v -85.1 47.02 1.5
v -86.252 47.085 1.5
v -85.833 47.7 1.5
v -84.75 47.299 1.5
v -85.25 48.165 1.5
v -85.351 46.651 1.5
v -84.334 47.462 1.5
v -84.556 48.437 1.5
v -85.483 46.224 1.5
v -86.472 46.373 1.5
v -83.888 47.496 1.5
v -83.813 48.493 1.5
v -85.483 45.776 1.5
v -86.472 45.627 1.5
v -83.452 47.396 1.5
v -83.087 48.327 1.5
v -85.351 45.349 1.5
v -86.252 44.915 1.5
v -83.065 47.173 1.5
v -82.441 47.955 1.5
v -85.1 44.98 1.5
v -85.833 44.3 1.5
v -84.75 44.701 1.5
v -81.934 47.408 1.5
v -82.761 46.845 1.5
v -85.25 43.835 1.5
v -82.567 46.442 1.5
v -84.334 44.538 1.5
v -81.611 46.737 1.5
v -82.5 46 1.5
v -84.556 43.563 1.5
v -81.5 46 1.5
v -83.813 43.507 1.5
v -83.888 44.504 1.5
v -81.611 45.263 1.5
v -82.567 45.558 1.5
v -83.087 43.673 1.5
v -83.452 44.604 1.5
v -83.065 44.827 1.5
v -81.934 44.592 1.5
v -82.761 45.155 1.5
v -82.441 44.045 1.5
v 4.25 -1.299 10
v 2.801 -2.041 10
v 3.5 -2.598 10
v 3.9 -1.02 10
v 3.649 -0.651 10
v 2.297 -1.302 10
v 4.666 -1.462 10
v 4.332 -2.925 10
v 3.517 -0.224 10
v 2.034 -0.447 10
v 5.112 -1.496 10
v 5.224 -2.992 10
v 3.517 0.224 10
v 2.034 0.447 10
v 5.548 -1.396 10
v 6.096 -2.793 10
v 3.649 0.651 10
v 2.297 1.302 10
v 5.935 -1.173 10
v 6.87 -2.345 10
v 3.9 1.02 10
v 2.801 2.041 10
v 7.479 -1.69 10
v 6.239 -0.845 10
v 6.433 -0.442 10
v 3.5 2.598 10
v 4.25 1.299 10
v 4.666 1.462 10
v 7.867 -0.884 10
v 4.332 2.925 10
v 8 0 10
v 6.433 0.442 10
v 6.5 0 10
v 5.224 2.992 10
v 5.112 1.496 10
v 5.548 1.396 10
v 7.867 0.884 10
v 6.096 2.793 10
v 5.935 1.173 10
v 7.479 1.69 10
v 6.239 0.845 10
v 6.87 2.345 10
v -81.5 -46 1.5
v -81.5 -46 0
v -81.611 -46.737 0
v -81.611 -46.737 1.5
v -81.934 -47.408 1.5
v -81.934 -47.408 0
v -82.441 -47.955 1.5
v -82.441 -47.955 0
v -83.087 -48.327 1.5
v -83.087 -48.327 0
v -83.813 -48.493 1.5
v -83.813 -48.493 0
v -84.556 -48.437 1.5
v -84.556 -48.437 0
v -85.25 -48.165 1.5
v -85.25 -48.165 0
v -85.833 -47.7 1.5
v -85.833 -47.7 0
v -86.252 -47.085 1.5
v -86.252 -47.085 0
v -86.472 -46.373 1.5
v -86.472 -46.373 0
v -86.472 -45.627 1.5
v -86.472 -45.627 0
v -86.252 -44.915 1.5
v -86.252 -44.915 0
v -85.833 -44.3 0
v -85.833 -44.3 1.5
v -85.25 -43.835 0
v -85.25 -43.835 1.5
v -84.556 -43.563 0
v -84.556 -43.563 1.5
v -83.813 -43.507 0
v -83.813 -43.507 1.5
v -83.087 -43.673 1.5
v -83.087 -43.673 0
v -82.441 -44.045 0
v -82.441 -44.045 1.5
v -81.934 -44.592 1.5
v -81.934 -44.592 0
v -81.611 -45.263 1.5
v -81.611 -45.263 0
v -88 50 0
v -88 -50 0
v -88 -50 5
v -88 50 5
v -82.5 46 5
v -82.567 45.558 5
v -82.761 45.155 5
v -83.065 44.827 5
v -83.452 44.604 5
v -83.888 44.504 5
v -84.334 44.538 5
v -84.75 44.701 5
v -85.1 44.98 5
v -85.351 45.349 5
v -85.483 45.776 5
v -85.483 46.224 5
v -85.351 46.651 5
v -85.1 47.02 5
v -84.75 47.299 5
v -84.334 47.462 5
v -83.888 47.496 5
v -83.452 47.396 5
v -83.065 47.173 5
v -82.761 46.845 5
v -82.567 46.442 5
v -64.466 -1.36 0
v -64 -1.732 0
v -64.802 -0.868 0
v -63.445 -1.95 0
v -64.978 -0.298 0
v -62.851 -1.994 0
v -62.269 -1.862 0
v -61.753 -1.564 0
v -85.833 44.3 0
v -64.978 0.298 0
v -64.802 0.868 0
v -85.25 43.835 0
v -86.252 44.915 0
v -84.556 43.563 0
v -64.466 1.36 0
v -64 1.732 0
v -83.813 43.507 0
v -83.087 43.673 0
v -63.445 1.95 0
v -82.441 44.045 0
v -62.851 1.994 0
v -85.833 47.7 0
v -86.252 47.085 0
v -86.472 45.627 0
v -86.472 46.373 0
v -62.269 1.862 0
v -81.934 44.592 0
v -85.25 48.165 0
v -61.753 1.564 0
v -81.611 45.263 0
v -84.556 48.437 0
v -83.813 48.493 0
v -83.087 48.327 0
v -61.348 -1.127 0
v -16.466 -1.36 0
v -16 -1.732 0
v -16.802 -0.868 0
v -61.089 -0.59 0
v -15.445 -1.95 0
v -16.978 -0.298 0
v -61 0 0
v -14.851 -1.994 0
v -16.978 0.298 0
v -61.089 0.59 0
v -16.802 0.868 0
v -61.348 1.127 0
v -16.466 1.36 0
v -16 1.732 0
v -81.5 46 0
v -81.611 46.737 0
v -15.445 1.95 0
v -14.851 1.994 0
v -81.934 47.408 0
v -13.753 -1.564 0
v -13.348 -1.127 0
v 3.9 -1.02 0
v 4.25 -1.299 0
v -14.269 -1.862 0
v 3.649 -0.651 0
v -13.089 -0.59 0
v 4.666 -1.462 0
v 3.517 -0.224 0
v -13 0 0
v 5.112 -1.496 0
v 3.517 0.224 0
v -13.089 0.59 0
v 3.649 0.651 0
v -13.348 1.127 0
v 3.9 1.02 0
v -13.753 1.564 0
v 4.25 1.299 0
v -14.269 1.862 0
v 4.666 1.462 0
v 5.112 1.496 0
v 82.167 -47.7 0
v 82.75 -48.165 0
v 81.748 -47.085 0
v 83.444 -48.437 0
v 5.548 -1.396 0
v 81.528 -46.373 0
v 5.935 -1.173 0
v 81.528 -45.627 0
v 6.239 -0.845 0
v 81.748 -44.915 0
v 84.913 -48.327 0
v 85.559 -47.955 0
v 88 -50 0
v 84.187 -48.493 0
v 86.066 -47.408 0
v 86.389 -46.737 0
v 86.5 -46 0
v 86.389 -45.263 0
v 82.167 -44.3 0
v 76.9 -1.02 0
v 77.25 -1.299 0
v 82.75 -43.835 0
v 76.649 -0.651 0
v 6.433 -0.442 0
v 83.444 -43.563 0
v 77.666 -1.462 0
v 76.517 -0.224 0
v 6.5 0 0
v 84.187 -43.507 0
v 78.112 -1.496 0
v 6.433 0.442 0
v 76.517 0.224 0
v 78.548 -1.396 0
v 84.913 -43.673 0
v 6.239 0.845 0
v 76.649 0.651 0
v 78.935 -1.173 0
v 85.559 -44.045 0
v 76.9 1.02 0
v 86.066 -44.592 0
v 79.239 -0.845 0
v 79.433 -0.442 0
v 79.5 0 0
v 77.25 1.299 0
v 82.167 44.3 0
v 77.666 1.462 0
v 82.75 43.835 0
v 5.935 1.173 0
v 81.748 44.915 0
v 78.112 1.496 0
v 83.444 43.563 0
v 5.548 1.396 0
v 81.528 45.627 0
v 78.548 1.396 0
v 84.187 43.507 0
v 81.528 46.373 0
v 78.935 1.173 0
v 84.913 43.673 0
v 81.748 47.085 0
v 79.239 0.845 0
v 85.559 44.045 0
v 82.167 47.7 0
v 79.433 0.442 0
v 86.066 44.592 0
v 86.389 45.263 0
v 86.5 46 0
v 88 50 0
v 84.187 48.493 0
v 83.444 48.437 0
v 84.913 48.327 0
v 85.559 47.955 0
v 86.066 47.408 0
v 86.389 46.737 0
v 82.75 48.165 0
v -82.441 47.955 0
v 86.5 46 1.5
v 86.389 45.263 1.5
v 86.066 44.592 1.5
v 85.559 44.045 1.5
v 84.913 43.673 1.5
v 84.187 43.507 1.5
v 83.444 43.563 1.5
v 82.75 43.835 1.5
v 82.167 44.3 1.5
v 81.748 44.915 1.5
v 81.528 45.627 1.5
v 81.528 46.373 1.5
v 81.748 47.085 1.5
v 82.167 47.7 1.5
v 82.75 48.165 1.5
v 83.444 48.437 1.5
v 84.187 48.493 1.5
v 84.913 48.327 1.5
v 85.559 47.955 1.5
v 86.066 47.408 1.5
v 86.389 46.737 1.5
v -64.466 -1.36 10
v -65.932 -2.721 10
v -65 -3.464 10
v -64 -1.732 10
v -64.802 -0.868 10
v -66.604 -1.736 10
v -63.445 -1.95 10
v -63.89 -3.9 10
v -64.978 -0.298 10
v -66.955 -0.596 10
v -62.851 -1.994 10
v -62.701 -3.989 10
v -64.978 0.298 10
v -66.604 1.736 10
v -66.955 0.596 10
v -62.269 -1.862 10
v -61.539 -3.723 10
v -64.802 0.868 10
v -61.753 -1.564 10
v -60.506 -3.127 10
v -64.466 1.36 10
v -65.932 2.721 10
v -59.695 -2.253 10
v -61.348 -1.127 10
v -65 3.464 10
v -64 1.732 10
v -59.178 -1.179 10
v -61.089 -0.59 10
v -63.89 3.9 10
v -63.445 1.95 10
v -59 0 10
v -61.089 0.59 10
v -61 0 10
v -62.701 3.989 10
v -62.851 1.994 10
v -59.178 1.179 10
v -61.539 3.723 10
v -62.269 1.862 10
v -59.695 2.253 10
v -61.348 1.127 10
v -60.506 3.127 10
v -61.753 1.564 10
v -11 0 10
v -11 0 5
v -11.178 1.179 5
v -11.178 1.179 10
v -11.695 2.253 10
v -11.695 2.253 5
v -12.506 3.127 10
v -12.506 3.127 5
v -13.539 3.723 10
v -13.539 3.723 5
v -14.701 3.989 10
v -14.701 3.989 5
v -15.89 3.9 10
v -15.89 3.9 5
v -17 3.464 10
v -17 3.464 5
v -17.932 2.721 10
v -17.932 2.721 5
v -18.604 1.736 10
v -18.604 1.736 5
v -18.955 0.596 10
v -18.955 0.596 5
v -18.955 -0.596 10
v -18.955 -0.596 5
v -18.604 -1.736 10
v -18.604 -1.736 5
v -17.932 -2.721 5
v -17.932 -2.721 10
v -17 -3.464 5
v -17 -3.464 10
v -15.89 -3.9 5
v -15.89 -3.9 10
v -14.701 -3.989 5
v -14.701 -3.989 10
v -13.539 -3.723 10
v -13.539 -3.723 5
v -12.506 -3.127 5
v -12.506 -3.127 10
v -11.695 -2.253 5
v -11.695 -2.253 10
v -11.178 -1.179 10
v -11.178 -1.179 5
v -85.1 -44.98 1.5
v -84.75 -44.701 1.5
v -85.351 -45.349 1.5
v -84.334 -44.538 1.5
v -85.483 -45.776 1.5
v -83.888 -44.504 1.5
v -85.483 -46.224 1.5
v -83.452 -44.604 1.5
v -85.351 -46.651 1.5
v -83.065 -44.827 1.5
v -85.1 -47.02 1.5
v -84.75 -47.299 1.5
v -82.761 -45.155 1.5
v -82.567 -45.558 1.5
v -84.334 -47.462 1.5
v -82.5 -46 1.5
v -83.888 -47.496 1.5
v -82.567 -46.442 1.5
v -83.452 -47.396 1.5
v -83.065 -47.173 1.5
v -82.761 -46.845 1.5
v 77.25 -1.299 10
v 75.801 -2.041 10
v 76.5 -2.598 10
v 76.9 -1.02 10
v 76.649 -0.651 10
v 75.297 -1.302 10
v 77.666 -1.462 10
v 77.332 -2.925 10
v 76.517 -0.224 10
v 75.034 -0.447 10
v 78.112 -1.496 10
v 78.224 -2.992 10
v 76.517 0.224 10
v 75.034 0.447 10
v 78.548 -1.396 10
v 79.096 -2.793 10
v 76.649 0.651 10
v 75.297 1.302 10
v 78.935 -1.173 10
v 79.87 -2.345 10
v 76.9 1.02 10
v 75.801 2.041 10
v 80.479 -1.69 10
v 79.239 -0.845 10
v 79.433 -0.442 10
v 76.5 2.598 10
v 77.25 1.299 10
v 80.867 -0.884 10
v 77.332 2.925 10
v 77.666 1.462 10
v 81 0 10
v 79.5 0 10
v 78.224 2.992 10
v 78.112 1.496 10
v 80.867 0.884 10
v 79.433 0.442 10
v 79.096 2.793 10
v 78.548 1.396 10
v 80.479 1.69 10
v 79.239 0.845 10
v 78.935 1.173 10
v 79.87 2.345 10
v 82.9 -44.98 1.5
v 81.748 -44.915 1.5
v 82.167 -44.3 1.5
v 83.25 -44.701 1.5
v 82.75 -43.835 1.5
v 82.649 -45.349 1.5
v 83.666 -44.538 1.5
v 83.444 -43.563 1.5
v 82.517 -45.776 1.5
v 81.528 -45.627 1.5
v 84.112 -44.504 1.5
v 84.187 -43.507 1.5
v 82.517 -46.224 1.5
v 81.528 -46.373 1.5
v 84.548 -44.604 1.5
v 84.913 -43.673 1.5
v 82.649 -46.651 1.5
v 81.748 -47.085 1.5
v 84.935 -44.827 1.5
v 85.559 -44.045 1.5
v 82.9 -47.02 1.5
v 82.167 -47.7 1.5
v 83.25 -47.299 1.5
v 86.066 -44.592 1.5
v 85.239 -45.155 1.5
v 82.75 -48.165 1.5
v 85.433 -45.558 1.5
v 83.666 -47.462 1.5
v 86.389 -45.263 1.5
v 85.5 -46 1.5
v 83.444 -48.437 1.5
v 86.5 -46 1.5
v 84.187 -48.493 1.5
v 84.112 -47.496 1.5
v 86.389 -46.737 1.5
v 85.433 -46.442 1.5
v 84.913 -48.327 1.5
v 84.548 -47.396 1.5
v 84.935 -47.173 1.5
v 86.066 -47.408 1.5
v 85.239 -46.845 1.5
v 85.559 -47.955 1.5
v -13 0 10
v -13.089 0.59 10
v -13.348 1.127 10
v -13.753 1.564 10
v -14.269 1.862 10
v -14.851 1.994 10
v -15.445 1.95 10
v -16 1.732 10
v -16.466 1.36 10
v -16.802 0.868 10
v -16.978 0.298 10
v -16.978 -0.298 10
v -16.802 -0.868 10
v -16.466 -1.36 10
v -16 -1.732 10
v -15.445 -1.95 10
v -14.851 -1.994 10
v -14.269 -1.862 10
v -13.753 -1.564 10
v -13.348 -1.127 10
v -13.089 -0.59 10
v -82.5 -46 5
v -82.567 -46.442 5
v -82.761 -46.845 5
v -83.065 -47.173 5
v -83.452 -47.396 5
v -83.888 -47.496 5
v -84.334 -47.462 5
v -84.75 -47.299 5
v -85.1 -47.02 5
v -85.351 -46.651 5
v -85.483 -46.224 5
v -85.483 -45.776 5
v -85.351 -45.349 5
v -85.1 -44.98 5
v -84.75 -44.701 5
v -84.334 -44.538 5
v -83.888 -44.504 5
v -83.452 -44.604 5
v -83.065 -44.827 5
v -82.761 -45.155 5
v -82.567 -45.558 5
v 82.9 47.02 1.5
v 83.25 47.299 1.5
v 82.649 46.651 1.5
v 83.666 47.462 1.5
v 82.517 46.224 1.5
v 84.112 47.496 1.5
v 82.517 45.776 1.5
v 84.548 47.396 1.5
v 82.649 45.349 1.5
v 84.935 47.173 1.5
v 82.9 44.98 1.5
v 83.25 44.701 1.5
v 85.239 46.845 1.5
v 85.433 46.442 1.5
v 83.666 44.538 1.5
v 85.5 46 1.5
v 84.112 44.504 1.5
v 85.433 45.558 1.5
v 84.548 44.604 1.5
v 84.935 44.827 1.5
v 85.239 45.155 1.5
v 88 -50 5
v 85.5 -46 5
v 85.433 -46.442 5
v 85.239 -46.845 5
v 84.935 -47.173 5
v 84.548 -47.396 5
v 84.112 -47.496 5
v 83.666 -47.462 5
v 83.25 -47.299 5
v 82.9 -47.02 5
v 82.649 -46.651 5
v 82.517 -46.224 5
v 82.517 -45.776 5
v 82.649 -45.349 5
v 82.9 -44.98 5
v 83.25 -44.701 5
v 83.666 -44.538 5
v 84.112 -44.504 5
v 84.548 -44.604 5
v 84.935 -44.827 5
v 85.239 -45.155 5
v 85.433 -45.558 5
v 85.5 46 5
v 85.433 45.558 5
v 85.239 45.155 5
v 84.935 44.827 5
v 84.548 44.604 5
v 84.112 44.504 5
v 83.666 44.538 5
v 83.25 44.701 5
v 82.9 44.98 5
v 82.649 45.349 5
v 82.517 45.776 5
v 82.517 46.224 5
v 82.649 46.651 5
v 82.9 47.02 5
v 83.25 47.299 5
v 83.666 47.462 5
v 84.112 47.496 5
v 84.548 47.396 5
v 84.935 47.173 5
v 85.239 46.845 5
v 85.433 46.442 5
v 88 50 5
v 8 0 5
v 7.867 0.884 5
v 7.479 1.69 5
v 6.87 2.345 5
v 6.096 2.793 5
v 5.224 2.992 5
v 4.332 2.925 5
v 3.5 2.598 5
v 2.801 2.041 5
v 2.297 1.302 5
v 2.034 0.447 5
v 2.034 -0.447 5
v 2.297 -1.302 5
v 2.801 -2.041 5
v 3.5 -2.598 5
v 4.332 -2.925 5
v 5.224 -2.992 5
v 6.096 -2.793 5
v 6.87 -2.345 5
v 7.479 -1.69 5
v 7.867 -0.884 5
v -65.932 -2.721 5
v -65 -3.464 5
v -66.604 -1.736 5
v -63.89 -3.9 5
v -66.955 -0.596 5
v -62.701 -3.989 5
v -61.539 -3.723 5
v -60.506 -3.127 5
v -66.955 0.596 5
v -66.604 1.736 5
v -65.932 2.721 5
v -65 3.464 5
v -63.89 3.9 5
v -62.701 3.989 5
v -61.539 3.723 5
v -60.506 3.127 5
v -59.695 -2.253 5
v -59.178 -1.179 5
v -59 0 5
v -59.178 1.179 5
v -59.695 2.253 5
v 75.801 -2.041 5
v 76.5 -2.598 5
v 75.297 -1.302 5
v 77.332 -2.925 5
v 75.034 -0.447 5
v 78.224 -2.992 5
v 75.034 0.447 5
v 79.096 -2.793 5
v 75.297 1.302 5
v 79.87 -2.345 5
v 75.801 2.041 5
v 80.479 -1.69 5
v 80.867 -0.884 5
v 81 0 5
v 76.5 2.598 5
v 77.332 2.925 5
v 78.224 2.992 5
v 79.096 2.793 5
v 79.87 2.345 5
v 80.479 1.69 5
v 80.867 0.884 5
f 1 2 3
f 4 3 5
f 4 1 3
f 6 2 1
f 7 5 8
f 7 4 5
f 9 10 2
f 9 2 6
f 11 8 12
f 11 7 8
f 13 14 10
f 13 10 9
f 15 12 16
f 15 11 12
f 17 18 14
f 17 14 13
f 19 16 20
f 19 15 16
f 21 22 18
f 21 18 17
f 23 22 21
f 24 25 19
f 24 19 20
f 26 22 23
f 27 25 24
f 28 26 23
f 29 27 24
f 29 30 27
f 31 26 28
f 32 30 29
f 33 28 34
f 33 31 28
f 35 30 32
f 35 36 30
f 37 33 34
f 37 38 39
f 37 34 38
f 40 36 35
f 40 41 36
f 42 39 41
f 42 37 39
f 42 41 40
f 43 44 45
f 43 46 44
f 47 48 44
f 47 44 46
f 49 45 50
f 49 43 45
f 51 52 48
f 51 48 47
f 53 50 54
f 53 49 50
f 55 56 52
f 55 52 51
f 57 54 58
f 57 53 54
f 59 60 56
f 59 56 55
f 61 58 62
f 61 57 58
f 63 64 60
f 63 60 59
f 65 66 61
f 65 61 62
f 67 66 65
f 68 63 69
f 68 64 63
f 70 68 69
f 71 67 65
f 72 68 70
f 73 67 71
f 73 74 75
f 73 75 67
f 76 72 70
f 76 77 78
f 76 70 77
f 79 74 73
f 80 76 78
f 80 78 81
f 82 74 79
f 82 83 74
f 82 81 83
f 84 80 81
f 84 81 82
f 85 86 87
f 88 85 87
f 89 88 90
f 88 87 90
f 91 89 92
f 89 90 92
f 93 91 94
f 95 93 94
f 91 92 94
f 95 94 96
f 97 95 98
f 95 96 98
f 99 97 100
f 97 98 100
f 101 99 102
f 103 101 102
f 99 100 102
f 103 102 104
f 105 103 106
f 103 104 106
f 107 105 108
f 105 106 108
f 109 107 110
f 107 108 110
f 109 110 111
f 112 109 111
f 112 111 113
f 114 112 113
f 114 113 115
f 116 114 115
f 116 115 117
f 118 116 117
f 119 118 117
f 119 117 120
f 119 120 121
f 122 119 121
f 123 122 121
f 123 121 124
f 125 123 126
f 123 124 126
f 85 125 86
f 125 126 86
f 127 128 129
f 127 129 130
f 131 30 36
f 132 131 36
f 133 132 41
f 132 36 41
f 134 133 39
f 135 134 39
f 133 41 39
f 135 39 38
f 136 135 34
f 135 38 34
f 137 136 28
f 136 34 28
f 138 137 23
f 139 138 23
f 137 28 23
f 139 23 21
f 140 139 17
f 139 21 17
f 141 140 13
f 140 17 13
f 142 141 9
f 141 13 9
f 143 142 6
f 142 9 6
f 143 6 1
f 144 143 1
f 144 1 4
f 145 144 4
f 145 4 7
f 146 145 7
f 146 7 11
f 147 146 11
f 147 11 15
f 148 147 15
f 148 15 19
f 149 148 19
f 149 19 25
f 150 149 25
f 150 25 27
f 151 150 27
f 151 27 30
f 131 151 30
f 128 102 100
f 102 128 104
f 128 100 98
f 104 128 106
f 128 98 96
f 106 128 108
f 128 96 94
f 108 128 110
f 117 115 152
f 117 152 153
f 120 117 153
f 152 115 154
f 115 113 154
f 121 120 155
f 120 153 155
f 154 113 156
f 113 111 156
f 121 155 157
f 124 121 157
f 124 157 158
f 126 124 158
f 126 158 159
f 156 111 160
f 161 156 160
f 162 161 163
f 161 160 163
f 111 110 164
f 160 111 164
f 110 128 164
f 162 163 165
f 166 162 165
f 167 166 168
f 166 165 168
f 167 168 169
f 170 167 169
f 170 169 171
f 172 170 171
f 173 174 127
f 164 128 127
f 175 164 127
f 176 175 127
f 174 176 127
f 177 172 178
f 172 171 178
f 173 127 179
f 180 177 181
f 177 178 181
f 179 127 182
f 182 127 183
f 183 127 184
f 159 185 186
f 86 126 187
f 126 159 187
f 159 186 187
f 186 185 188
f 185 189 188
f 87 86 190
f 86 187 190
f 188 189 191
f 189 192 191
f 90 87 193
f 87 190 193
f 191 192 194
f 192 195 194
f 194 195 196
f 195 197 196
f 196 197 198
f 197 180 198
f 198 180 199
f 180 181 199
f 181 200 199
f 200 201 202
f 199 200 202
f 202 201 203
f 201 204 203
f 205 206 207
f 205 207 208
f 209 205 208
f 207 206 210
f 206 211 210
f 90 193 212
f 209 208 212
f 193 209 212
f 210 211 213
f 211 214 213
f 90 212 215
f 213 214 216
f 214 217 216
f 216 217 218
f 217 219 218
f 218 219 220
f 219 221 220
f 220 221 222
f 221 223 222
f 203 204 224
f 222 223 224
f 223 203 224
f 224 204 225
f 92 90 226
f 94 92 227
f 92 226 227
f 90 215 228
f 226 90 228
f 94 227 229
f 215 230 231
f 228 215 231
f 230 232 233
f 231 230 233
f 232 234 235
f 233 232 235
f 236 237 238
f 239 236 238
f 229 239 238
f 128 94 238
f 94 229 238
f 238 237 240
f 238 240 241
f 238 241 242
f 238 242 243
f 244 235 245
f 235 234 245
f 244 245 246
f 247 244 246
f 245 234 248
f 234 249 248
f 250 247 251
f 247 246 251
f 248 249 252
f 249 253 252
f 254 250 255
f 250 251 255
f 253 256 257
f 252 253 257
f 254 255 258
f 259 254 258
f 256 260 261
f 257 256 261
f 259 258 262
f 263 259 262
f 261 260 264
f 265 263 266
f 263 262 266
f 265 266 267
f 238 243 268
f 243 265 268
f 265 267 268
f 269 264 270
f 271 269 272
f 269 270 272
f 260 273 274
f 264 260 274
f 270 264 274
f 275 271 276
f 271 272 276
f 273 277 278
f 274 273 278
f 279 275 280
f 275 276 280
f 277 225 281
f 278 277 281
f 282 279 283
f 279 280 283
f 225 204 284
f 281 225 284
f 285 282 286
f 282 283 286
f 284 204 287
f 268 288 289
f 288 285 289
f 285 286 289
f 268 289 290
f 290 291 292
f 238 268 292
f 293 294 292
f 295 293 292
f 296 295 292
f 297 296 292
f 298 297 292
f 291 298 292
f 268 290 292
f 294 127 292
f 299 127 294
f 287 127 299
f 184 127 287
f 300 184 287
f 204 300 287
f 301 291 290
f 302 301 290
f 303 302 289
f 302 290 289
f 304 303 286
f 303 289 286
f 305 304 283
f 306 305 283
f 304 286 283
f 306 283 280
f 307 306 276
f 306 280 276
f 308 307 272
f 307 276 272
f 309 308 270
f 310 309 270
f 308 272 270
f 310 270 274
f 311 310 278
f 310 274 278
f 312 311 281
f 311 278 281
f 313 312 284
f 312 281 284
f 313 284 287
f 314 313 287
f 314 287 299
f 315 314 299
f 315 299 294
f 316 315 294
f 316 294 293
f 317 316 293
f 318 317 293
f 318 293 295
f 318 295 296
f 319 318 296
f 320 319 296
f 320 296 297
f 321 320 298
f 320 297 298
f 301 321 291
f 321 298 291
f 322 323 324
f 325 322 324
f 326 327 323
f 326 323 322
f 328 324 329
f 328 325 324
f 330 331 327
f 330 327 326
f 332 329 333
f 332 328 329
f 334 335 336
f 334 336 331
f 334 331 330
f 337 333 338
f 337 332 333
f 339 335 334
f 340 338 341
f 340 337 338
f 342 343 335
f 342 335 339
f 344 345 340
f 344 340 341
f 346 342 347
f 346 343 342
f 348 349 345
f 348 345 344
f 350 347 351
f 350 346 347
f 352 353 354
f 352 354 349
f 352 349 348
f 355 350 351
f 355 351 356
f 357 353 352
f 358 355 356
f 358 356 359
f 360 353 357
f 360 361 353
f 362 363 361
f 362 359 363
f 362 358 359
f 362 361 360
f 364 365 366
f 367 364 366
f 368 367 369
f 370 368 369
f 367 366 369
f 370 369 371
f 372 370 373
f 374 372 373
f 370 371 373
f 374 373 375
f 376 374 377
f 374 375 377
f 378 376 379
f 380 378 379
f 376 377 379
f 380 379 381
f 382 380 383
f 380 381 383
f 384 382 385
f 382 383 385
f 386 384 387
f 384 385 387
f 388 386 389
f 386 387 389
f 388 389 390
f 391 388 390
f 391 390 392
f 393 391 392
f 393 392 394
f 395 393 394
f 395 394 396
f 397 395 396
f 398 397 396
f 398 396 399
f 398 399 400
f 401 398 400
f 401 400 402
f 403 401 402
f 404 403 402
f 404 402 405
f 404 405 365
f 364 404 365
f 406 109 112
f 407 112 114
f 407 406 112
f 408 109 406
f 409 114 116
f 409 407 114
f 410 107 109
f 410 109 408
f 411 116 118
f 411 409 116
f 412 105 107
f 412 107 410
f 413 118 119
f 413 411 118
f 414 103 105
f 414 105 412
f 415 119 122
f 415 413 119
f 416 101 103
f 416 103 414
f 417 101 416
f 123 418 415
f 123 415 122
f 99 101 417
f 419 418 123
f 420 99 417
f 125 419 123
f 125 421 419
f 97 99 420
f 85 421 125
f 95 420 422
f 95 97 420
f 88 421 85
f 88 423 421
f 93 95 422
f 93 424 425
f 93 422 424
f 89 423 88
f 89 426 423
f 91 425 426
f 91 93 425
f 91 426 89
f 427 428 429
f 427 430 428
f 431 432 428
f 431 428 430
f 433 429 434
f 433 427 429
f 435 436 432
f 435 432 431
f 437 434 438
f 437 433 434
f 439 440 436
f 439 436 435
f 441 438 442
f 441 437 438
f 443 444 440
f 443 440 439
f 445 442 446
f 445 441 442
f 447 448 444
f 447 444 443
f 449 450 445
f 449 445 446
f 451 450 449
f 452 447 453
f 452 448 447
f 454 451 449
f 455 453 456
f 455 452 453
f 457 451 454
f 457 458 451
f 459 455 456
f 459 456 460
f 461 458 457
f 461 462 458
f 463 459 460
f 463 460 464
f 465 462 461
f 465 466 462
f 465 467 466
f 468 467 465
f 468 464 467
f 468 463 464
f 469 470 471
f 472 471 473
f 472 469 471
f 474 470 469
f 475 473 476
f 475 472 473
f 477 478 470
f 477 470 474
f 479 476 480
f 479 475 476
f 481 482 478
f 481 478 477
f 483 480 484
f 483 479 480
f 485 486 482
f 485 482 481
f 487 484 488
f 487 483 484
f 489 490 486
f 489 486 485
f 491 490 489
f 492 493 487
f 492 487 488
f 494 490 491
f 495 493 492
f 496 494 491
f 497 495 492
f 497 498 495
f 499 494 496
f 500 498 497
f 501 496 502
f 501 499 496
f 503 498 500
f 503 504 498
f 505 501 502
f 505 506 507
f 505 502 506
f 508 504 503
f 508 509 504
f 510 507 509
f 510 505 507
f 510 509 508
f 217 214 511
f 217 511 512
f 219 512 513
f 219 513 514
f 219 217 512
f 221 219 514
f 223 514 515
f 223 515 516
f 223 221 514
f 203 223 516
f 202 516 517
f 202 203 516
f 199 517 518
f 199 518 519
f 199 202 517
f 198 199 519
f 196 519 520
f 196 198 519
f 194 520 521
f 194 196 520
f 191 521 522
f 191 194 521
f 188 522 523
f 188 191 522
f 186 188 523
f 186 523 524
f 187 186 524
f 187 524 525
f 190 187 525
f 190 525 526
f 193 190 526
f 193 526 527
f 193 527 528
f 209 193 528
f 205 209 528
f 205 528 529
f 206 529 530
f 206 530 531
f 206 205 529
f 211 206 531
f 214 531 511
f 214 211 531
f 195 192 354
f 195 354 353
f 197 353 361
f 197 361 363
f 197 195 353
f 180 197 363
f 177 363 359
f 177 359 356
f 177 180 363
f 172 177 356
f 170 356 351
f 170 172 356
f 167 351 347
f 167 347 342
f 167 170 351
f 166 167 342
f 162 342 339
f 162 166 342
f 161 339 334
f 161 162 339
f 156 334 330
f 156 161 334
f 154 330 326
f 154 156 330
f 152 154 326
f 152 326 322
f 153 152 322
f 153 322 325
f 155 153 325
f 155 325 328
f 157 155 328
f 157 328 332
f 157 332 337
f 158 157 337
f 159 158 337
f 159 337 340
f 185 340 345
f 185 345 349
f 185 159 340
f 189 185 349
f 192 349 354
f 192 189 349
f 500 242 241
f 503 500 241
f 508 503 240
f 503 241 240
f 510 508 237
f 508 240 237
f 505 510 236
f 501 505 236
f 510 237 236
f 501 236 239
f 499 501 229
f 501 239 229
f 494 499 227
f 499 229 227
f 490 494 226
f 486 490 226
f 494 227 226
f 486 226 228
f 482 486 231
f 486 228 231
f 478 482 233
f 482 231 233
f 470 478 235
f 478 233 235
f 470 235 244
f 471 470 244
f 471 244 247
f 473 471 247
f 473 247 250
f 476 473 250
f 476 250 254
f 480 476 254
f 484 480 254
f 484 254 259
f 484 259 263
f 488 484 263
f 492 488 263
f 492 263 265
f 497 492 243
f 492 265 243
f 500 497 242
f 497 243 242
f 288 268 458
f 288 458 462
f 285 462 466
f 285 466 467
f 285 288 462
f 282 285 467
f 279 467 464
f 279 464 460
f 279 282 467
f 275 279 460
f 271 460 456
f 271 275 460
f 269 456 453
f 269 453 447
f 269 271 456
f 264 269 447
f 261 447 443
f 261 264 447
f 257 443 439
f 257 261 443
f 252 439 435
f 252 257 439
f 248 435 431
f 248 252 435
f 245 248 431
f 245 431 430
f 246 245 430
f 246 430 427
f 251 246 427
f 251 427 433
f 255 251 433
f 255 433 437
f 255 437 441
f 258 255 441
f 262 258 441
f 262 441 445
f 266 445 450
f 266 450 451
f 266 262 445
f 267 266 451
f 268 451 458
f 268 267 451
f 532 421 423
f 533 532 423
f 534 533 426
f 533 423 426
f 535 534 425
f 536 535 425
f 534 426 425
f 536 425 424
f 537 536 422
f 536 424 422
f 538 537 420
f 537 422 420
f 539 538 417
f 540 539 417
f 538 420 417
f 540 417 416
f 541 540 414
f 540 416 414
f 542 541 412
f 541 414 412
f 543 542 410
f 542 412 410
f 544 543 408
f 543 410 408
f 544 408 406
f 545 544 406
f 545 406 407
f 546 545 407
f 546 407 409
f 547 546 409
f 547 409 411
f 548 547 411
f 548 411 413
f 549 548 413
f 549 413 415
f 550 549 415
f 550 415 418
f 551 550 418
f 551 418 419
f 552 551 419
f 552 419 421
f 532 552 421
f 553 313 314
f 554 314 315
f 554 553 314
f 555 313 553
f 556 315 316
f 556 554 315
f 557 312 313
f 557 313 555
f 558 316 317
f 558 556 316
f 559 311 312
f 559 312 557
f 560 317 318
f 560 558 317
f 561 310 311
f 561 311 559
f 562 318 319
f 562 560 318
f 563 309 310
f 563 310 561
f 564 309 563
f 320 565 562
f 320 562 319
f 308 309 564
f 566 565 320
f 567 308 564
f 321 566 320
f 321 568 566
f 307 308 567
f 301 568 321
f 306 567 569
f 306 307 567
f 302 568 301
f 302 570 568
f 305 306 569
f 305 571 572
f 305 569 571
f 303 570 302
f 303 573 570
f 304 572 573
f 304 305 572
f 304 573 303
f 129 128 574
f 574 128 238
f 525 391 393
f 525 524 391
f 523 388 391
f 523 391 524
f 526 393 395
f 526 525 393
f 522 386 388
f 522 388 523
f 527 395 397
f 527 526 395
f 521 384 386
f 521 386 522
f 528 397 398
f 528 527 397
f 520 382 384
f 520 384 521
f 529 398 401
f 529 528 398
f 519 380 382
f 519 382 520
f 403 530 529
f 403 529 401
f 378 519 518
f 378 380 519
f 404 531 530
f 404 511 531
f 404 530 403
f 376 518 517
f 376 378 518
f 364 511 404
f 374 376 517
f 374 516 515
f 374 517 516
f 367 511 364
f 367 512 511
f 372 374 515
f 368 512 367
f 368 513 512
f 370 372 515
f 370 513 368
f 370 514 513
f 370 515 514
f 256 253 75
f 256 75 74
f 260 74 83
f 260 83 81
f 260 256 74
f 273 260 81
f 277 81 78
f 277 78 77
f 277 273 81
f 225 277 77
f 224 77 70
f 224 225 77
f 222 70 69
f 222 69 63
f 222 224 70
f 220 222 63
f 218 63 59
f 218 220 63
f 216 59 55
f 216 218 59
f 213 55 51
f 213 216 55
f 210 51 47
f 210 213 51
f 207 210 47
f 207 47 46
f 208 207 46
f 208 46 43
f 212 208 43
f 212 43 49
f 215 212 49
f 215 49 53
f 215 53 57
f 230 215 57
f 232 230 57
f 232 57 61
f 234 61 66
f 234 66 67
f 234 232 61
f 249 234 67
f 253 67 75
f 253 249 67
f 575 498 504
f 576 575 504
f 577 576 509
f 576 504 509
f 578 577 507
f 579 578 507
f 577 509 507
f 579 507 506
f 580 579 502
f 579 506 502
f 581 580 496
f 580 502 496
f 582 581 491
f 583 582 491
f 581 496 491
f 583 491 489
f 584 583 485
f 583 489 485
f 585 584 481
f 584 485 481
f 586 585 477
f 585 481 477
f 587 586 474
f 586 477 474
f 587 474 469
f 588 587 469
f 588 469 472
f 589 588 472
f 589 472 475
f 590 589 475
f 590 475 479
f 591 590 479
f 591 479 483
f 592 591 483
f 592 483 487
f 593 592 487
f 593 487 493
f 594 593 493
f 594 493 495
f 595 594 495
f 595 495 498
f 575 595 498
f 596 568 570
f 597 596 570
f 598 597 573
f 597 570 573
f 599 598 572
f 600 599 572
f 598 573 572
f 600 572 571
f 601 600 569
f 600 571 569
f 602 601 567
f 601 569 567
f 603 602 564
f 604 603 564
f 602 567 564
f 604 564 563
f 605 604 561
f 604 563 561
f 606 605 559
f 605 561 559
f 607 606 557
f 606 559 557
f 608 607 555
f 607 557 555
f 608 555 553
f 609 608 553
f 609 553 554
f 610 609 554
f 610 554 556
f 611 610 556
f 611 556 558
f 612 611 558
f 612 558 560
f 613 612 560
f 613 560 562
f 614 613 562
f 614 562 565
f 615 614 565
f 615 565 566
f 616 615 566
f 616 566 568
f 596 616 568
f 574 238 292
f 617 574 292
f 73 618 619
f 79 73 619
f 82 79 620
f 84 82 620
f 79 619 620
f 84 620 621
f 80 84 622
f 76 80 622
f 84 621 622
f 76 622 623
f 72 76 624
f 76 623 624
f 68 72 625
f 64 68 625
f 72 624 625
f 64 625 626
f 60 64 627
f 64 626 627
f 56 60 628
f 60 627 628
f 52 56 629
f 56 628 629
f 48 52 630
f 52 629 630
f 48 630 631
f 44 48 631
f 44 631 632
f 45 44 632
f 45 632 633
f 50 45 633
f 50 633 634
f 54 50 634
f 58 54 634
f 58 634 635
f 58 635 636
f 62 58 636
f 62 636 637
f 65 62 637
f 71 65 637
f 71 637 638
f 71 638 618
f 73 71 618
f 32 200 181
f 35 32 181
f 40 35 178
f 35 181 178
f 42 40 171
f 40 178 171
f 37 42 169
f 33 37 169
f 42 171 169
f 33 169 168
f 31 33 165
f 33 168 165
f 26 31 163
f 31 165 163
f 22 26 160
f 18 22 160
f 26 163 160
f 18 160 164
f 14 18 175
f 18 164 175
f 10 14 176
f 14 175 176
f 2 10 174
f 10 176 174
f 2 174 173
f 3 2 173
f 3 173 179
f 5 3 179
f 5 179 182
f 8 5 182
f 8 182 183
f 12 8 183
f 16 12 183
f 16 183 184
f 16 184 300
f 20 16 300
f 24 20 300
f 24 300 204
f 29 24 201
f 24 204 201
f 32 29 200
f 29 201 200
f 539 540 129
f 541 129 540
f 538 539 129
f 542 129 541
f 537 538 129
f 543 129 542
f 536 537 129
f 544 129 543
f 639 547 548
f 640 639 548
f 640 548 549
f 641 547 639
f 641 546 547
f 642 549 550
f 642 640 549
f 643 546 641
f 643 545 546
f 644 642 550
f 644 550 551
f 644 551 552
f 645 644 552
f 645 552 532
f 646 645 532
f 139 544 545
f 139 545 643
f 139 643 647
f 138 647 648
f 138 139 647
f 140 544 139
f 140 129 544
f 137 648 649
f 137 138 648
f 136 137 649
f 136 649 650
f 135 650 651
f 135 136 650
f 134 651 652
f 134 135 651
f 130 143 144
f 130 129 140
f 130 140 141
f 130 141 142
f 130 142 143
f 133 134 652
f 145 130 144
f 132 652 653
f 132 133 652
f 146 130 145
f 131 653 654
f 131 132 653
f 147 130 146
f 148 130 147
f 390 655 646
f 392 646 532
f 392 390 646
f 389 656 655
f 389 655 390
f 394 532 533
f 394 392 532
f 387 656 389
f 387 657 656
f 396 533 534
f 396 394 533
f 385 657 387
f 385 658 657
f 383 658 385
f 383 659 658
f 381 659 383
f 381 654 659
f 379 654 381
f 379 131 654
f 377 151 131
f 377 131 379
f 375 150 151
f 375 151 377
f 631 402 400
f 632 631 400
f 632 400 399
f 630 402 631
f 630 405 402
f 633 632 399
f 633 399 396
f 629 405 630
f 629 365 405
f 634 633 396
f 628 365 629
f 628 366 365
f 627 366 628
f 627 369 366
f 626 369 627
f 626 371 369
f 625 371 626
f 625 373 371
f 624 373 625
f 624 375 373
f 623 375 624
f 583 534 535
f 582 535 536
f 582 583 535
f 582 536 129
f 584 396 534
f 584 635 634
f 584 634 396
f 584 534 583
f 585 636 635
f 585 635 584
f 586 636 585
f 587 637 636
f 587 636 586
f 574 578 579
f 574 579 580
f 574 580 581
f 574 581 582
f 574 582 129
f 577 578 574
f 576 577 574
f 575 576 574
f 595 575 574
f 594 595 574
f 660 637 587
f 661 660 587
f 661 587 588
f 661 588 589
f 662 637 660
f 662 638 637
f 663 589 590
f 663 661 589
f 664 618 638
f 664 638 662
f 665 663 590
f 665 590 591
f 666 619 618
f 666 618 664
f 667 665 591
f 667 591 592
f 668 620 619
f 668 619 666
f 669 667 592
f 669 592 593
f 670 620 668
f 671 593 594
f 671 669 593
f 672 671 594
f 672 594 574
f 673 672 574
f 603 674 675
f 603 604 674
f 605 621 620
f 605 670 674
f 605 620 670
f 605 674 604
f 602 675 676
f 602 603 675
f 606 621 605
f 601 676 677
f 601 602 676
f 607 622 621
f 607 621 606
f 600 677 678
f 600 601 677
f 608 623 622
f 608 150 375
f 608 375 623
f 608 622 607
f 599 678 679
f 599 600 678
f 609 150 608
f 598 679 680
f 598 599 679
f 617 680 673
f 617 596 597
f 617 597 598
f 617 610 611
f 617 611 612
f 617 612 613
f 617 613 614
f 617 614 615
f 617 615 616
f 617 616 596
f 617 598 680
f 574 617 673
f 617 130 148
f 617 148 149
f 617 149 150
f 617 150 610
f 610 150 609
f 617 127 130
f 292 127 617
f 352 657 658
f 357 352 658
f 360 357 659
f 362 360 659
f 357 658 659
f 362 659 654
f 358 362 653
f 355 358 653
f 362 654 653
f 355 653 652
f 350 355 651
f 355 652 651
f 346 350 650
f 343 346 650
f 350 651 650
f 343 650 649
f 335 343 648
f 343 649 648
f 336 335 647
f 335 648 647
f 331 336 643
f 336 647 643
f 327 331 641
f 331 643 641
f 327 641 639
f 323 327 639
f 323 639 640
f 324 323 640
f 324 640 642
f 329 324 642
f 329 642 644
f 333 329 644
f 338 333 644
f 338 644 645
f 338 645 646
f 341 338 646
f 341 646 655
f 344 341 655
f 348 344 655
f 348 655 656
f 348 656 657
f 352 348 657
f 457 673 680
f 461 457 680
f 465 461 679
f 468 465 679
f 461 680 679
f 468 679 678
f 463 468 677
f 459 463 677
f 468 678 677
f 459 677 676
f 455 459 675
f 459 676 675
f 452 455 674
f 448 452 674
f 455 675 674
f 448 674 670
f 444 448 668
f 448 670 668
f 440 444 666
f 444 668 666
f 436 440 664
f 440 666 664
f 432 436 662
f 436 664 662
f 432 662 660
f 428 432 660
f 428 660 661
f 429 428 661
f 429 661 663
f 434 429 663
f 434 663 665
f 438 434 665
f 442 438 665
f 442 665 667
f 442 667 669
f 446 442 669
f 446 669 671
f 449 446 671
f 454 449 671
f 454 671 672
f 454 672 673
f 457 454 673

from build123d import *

# Parameters (mm, degrees)
F0_W     = 176
F0_H     = 100
F0_R     = 4
F0_R_2   = 3
F1_DEPTH = 5
F0_R_3   = 2
F0_R_4   = 1.5
F2_DEPTH = 10
F4_R     = 1.5
F5_DEPTH = 10.001
F4_R_2   = 2.5
F6_DEPTH = 1.5


with BuildPart() as f1:
    # F0 (on Top) → F1 (new body)
    with BuildSketch(Plane.XY):
        Rectangle(F0_W, F0_H)
        with Locations((-63, 0)):
            Circle(F0_R, mode=Mode.SUBTRACT)
        with Locations((-15, 0)):
            Circle(F0_R, mode=Mode.SUBTRACT)
        with Locations((5, 0)):
            Circle(F0_R_2, mode=Mode.SUBTRACT)
        with Locations((78, 0)):
            Circle(F0_R_2, mode=Mode.SUBTRACT)
    extrude(amount=F1_DEPTH)

    # F0 (on Top) → F2 (join)
    with BuildSketch(Plane.XY):
        with Locations((-63, 0)):
            Circle(F0_R)
        with Locations((-63, 0)):
            Circle(F0_R_3, mode=Mode.SUBTRACT)
        with Locations((-15, 0)):
            Circle(F0_R)
        with Locations((-15, 0)):
            Circle(F0_R_3, mode=Mode.SUBTRACT)
        with Locations((5, 0)):
            Circle(F0_R_2)
        with Locations((5, 0)):
            Circle(F0_R_4, mode=Mode.SUBTRACT)
        with Locations((78, 0)):
            Circle(F0_R_2)
        with Locations((78, 0)):
            Circle(F0_R_4, mode=Mode.SUBTRACT)
    extrude(amount=F2_DEPTH)

    # F4 (on face) → F5 (cut, through all)
    with BuildSketch(Plane(origin=(0, 0, 0), x_dir=(1, 0, 0), z_dir=(0, 0, -1))):
        with Locations((-84, 46)):
            Circle(F4_R)
        with Locations((-84, -46)):
            Circle(F4_R)
        with Locations((84, 46)):
            Circle(F4_R)
        with Locations((84, -46)):
            Circle(F4_R)
    extrude(amount=-F5_DEPTH, mode=Mode.SUBTRACT)

    # F4 (on face) → F6 (cut)
    with BuildSketch(Plane(origin=(0, 0, 0), x_dir=(1, 0, 0), z_dir=(0, 0, -1))):
        with Locations((84, -46)):
            Circle(F4_R_2)
        with Locations((84, -46)):
            Circle(F4_R, mode=Mode.SUBTRACT)
        with Locations((84, 46)):
            Circle(F4_R_2)
        with Locations((84, 46)):
            Circle(F4_R, mode=Mode.SUBTRACT)
        with Locations((-84, 46)):
            Circle(F4_R_2)
        with Locations((-84, 46)):
            Circle(F4_R, mode=Mode.SUBTRACT)
        with Locations((-84, -46)):
            Circle(F4_R_2)
        with Locations((-84, -46)):
            Circle(F4_R, mode=Mode.SUBTRACT)
    extrude(amount=-F6_DEPTH, mode=Mode.SUBTRACT)


solid = f1.part
